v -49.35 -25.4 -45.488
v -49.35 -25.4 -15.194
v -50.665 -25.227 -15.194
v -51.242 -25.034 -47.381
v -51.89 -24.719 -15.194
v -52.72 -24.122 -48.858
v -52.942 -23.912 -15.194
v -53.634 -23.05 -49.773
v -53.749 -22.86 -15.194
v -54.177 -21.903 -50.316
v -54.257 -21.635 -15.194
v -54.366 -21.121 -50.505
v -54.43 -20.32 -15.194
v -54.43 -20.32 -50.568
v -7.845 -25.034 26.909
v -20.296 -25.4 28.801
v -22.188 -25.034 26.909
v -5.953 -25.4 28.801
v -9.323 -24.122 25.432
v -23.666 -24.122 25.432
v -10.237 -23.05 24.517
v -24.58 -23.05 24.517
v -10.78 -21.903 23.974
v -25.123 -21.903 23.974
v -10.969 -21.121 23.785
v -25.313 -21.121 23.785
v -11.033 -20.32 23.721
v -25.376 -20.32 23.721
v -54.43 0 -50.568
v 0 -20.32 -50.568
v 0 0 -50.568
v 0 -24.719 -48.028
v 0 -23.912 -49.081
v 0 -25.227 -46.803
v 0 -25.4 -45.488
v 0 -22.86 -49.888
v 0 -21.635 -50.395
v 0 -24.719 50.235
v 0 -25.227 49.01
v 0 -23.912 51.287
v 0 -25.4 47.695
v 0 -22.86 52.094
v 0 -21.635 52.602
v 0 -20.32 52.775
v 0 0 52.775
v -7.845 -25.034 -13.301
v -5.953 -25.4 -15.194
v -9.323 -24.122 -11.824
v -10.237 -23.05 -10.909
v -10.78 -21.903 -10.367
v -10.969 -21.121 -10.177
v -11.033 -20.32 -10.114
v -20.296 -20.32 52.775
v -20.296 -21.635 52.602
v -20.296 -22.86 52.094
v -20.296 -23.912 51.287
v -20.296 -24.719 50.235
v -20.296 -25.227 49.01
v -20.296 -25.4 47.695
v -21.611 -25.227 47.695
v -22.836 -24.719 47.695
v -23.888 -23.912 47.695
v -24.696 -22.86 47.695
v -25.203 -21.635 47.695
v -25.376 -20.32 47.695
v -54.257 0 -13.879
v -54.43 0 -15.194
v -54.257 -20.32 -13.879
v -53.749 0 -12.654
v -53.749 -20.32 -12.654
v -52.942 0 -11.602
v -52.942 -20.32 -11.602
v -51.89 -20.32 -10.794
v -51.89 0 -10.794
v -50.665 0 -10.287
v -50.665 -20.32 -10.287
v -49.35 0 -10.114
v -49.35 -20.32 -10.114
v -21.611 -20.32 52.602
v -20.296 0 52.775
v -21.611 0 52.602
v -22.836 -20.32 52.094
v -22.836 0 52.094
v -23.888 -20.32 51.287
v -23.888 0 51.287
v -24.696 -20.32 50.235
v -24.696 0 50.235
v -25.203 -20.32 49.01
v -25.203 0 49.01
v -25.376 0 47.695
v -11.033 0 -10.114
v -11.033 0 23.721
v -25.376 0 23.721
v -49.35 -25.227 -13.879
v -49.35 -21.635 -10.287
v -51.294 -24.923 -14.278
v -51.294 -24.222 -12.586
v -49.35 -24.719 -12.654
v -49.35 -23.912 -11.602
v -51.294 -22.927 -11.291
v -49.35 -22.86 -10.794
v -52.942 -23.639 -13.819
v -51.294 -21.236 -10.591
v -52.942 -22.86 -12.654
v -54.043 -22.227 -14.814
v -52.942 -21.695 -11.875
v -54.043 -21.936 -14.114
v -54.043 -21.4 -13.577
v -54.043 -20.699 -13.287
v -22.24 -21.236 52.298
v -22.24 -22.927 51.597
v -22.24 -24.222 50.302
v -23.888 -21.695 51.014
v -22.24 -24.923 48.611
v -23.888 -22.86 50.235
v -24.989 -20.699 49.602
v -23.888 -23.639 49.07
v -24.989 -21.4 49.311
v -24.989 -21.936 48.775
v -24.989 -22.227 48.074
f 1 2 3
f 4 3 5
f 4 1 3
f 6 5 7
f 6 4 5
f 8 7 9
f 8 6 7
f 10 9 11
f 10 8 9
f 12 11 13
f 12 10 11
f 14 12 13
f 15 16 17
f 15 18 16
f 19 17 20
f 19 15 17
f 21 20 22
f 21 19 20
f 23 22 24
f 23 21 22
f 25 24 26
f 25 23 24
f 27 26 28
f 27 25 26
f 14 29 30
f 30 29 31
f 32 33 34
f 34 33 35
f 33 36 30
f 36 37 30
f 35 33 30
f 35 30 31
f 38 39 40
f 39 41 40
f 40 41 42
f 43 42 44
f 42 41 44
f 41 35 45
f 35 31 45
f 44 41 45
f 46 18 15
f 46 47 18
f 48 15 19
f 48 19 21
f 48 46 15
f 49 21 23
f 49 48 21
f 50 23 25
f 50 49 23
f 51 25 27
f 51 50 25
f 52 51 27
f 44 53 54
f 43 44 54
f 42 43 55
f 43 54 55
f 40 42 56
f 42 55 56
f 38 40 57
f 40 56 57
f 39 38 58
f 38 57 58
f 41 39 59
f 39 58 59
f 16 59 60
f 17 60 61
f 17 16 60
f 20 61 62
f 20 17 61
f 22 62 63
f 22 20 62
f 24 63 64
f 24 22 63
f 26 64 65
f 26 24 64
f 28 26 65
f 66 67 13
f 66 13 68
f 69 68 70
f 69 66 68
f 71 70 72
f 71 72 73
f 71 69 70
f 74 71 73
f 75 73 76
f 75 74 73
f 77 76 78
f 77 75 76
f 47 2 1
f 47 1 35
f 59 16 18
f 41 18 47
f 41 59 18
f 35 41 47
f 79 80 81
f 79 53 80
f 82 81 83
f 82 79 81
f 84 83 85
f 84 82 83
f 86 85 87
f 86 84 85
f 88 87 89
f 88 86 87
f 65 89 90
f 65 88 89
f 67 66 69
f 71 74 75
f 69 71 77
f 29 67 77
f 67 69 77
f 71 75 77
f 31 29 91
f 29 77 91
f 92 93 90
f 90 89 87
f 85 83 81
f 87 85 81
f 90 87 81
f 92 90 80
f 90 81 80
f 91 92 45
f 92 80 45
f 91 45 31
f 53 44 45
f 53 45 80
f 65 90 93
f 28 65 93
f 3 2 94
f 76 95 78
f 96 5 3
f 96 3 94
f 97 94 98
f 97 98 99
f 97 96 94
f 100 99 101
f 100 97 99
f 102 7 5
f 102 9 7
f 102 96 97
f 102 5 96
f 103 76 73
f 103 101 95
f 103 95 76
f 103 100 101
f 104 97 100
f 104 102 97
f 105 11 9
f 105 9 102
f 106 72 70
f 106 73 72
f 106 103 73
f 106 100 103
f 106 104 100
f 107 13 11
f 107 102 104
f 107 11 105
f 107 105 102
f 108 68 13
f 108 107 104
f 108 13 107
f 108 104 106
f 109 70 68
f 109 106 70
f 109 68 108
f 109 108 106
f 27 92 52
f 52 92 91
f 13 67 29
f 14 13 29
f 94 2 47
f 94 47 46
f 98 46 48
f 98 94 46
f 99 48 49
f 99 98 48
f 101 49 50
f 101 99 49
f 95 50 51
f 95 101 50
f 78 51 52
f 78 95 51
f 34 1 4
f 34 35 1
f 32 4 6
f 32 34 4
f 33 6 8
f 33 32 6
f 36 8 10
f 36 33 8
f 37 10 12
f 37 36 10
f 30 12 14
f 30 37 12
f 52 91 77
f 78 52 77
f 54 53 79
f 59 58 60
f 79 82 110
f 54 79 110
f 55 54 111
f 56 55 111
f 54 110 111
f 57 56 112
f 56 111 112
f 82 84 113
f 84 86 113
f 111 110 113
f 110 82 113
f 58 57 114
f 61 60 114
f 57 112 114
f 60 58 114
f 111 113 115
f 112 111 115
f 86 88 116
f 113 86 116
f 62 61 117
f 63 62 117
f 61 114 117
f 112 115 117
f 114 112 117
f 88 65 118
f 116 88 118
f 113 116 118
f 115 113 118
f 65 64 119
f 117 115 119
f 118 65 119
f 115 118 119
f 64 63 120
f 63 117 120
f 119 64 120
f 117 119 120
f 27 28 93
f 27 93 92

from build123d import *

# Parameters (mm, degrees)
F1_DEPTH    = 25.4
F2_R        = 5.08
F3_R        = 5.08
F4_T1_DEPTH = 33.02
F4_S5_W     = 5.08
F4_S5_H     = 5.08
F4_T6_DEPTH = 5.08


# Not quite as in the source:
# - a fillet or chamfer that OpenCascade refuses, or shapes differently, is made with other operations: its cross-section is extruded or revolved along the edge and cut away or added


with BuildPart() as f1:
    # F0 (on Front) → F1 (new body)
    with BuildSketch(Plane.XZ):
        Polygon((0, -50.5684018135), (0, 52.7750141919), (-25.3761447966, 52.7750141919), (-25.3761447966, 23.721171543), (-11.0331093892, 23.721171543), (-11.0331093892, -10.1136825979), (-54.4299855828, -10.1136825979), (-54.4299855828, -50.5684018135), align=None)
    extrude(amount=F1_DEPTH)

    # F2
    f2_edges = [f1.edges().sort_by_distance(p)[0] for p in [
        (-12.688072, -25.4, 52.775014),
    ]]
    fillet(f2_edges, radius=F2_R)

    # F3
    f3_edges = [f1.edges().sort_by_distance(p)[0] for p in [
        (-27.214993, -25.4, -50.568402),
        (-54.429986, -25.4, -30.341042),
        (-32.731547, -25.4, -10.113683),
        (-11.033109, -25.4, 6.803744),
        (-25.376145, -25.4, 35.708093),
        (-18.204627, -25.4, 23.721172),
    ]]
    fillet(f3_edges, radius=F3_R)

    # F4: fillet of radius 5.08 on 1 edges, made by hand

    # F4_s2 → F4_t1 (cut)
    with BuildSketch(Plane.XZ.offset(-12.7)):
        with BuildLine():
            ThreePointArc((-54.4299855828, -15.1936825979), (-52.9420880313, -11.6015801494), (-49.3499855828, -10.1136825979))
            Line((-49.3499855828, -10.1136825979), (-54.4299855828, -10.1136825979))
            Line((-54.4299855828, -10.1136825979), (-54.4299855828, -15.1936825979))
        make_face()
    extrude(amount=F4_T1_DEPTH, mode=Mode.SUBTRACT)


with BuildPart() as f4_tool4:
    # F4_s5 → F4_t6 (new body)
    with BuildSketch(Plane.YZ.offset(-49.3499855828)):
        with Locations((-22.86, -12.6536825979)):
            Rectangle(F4_S5_W, F4_S5_H)
    extrude(amount=-F4_T6_DEPTH)

    # F4_s7 → F4_t8 (revolve, cut)
    with BuildSketch(Plane(origin=(-49.3499855828, -20.32, -15.1936825979), x_dir=(0, 0.7071067812, -0.7071067812), z_dir=(0, 0.7071067812, 0.7071067812))):
        with BuildLine():
            ThreePointArc((0, -5.08), (5.08, 0), (0, 5.08))
            Line((0, 5.08), (0, -5.08))
        make_face()
    revolve(axis=Axis((-49.3499855828, -20.32, -15.1936825979), (-1, 0, 0)), mode=Mode.SUBTRACT)


with BuildPart() as f1_1:
    add(f1.part)

    # F4_t3: cut F4_tool4
    add(f4_tool4.part, mode=Mode.SUBTRACT)


solid = f1_1.part
